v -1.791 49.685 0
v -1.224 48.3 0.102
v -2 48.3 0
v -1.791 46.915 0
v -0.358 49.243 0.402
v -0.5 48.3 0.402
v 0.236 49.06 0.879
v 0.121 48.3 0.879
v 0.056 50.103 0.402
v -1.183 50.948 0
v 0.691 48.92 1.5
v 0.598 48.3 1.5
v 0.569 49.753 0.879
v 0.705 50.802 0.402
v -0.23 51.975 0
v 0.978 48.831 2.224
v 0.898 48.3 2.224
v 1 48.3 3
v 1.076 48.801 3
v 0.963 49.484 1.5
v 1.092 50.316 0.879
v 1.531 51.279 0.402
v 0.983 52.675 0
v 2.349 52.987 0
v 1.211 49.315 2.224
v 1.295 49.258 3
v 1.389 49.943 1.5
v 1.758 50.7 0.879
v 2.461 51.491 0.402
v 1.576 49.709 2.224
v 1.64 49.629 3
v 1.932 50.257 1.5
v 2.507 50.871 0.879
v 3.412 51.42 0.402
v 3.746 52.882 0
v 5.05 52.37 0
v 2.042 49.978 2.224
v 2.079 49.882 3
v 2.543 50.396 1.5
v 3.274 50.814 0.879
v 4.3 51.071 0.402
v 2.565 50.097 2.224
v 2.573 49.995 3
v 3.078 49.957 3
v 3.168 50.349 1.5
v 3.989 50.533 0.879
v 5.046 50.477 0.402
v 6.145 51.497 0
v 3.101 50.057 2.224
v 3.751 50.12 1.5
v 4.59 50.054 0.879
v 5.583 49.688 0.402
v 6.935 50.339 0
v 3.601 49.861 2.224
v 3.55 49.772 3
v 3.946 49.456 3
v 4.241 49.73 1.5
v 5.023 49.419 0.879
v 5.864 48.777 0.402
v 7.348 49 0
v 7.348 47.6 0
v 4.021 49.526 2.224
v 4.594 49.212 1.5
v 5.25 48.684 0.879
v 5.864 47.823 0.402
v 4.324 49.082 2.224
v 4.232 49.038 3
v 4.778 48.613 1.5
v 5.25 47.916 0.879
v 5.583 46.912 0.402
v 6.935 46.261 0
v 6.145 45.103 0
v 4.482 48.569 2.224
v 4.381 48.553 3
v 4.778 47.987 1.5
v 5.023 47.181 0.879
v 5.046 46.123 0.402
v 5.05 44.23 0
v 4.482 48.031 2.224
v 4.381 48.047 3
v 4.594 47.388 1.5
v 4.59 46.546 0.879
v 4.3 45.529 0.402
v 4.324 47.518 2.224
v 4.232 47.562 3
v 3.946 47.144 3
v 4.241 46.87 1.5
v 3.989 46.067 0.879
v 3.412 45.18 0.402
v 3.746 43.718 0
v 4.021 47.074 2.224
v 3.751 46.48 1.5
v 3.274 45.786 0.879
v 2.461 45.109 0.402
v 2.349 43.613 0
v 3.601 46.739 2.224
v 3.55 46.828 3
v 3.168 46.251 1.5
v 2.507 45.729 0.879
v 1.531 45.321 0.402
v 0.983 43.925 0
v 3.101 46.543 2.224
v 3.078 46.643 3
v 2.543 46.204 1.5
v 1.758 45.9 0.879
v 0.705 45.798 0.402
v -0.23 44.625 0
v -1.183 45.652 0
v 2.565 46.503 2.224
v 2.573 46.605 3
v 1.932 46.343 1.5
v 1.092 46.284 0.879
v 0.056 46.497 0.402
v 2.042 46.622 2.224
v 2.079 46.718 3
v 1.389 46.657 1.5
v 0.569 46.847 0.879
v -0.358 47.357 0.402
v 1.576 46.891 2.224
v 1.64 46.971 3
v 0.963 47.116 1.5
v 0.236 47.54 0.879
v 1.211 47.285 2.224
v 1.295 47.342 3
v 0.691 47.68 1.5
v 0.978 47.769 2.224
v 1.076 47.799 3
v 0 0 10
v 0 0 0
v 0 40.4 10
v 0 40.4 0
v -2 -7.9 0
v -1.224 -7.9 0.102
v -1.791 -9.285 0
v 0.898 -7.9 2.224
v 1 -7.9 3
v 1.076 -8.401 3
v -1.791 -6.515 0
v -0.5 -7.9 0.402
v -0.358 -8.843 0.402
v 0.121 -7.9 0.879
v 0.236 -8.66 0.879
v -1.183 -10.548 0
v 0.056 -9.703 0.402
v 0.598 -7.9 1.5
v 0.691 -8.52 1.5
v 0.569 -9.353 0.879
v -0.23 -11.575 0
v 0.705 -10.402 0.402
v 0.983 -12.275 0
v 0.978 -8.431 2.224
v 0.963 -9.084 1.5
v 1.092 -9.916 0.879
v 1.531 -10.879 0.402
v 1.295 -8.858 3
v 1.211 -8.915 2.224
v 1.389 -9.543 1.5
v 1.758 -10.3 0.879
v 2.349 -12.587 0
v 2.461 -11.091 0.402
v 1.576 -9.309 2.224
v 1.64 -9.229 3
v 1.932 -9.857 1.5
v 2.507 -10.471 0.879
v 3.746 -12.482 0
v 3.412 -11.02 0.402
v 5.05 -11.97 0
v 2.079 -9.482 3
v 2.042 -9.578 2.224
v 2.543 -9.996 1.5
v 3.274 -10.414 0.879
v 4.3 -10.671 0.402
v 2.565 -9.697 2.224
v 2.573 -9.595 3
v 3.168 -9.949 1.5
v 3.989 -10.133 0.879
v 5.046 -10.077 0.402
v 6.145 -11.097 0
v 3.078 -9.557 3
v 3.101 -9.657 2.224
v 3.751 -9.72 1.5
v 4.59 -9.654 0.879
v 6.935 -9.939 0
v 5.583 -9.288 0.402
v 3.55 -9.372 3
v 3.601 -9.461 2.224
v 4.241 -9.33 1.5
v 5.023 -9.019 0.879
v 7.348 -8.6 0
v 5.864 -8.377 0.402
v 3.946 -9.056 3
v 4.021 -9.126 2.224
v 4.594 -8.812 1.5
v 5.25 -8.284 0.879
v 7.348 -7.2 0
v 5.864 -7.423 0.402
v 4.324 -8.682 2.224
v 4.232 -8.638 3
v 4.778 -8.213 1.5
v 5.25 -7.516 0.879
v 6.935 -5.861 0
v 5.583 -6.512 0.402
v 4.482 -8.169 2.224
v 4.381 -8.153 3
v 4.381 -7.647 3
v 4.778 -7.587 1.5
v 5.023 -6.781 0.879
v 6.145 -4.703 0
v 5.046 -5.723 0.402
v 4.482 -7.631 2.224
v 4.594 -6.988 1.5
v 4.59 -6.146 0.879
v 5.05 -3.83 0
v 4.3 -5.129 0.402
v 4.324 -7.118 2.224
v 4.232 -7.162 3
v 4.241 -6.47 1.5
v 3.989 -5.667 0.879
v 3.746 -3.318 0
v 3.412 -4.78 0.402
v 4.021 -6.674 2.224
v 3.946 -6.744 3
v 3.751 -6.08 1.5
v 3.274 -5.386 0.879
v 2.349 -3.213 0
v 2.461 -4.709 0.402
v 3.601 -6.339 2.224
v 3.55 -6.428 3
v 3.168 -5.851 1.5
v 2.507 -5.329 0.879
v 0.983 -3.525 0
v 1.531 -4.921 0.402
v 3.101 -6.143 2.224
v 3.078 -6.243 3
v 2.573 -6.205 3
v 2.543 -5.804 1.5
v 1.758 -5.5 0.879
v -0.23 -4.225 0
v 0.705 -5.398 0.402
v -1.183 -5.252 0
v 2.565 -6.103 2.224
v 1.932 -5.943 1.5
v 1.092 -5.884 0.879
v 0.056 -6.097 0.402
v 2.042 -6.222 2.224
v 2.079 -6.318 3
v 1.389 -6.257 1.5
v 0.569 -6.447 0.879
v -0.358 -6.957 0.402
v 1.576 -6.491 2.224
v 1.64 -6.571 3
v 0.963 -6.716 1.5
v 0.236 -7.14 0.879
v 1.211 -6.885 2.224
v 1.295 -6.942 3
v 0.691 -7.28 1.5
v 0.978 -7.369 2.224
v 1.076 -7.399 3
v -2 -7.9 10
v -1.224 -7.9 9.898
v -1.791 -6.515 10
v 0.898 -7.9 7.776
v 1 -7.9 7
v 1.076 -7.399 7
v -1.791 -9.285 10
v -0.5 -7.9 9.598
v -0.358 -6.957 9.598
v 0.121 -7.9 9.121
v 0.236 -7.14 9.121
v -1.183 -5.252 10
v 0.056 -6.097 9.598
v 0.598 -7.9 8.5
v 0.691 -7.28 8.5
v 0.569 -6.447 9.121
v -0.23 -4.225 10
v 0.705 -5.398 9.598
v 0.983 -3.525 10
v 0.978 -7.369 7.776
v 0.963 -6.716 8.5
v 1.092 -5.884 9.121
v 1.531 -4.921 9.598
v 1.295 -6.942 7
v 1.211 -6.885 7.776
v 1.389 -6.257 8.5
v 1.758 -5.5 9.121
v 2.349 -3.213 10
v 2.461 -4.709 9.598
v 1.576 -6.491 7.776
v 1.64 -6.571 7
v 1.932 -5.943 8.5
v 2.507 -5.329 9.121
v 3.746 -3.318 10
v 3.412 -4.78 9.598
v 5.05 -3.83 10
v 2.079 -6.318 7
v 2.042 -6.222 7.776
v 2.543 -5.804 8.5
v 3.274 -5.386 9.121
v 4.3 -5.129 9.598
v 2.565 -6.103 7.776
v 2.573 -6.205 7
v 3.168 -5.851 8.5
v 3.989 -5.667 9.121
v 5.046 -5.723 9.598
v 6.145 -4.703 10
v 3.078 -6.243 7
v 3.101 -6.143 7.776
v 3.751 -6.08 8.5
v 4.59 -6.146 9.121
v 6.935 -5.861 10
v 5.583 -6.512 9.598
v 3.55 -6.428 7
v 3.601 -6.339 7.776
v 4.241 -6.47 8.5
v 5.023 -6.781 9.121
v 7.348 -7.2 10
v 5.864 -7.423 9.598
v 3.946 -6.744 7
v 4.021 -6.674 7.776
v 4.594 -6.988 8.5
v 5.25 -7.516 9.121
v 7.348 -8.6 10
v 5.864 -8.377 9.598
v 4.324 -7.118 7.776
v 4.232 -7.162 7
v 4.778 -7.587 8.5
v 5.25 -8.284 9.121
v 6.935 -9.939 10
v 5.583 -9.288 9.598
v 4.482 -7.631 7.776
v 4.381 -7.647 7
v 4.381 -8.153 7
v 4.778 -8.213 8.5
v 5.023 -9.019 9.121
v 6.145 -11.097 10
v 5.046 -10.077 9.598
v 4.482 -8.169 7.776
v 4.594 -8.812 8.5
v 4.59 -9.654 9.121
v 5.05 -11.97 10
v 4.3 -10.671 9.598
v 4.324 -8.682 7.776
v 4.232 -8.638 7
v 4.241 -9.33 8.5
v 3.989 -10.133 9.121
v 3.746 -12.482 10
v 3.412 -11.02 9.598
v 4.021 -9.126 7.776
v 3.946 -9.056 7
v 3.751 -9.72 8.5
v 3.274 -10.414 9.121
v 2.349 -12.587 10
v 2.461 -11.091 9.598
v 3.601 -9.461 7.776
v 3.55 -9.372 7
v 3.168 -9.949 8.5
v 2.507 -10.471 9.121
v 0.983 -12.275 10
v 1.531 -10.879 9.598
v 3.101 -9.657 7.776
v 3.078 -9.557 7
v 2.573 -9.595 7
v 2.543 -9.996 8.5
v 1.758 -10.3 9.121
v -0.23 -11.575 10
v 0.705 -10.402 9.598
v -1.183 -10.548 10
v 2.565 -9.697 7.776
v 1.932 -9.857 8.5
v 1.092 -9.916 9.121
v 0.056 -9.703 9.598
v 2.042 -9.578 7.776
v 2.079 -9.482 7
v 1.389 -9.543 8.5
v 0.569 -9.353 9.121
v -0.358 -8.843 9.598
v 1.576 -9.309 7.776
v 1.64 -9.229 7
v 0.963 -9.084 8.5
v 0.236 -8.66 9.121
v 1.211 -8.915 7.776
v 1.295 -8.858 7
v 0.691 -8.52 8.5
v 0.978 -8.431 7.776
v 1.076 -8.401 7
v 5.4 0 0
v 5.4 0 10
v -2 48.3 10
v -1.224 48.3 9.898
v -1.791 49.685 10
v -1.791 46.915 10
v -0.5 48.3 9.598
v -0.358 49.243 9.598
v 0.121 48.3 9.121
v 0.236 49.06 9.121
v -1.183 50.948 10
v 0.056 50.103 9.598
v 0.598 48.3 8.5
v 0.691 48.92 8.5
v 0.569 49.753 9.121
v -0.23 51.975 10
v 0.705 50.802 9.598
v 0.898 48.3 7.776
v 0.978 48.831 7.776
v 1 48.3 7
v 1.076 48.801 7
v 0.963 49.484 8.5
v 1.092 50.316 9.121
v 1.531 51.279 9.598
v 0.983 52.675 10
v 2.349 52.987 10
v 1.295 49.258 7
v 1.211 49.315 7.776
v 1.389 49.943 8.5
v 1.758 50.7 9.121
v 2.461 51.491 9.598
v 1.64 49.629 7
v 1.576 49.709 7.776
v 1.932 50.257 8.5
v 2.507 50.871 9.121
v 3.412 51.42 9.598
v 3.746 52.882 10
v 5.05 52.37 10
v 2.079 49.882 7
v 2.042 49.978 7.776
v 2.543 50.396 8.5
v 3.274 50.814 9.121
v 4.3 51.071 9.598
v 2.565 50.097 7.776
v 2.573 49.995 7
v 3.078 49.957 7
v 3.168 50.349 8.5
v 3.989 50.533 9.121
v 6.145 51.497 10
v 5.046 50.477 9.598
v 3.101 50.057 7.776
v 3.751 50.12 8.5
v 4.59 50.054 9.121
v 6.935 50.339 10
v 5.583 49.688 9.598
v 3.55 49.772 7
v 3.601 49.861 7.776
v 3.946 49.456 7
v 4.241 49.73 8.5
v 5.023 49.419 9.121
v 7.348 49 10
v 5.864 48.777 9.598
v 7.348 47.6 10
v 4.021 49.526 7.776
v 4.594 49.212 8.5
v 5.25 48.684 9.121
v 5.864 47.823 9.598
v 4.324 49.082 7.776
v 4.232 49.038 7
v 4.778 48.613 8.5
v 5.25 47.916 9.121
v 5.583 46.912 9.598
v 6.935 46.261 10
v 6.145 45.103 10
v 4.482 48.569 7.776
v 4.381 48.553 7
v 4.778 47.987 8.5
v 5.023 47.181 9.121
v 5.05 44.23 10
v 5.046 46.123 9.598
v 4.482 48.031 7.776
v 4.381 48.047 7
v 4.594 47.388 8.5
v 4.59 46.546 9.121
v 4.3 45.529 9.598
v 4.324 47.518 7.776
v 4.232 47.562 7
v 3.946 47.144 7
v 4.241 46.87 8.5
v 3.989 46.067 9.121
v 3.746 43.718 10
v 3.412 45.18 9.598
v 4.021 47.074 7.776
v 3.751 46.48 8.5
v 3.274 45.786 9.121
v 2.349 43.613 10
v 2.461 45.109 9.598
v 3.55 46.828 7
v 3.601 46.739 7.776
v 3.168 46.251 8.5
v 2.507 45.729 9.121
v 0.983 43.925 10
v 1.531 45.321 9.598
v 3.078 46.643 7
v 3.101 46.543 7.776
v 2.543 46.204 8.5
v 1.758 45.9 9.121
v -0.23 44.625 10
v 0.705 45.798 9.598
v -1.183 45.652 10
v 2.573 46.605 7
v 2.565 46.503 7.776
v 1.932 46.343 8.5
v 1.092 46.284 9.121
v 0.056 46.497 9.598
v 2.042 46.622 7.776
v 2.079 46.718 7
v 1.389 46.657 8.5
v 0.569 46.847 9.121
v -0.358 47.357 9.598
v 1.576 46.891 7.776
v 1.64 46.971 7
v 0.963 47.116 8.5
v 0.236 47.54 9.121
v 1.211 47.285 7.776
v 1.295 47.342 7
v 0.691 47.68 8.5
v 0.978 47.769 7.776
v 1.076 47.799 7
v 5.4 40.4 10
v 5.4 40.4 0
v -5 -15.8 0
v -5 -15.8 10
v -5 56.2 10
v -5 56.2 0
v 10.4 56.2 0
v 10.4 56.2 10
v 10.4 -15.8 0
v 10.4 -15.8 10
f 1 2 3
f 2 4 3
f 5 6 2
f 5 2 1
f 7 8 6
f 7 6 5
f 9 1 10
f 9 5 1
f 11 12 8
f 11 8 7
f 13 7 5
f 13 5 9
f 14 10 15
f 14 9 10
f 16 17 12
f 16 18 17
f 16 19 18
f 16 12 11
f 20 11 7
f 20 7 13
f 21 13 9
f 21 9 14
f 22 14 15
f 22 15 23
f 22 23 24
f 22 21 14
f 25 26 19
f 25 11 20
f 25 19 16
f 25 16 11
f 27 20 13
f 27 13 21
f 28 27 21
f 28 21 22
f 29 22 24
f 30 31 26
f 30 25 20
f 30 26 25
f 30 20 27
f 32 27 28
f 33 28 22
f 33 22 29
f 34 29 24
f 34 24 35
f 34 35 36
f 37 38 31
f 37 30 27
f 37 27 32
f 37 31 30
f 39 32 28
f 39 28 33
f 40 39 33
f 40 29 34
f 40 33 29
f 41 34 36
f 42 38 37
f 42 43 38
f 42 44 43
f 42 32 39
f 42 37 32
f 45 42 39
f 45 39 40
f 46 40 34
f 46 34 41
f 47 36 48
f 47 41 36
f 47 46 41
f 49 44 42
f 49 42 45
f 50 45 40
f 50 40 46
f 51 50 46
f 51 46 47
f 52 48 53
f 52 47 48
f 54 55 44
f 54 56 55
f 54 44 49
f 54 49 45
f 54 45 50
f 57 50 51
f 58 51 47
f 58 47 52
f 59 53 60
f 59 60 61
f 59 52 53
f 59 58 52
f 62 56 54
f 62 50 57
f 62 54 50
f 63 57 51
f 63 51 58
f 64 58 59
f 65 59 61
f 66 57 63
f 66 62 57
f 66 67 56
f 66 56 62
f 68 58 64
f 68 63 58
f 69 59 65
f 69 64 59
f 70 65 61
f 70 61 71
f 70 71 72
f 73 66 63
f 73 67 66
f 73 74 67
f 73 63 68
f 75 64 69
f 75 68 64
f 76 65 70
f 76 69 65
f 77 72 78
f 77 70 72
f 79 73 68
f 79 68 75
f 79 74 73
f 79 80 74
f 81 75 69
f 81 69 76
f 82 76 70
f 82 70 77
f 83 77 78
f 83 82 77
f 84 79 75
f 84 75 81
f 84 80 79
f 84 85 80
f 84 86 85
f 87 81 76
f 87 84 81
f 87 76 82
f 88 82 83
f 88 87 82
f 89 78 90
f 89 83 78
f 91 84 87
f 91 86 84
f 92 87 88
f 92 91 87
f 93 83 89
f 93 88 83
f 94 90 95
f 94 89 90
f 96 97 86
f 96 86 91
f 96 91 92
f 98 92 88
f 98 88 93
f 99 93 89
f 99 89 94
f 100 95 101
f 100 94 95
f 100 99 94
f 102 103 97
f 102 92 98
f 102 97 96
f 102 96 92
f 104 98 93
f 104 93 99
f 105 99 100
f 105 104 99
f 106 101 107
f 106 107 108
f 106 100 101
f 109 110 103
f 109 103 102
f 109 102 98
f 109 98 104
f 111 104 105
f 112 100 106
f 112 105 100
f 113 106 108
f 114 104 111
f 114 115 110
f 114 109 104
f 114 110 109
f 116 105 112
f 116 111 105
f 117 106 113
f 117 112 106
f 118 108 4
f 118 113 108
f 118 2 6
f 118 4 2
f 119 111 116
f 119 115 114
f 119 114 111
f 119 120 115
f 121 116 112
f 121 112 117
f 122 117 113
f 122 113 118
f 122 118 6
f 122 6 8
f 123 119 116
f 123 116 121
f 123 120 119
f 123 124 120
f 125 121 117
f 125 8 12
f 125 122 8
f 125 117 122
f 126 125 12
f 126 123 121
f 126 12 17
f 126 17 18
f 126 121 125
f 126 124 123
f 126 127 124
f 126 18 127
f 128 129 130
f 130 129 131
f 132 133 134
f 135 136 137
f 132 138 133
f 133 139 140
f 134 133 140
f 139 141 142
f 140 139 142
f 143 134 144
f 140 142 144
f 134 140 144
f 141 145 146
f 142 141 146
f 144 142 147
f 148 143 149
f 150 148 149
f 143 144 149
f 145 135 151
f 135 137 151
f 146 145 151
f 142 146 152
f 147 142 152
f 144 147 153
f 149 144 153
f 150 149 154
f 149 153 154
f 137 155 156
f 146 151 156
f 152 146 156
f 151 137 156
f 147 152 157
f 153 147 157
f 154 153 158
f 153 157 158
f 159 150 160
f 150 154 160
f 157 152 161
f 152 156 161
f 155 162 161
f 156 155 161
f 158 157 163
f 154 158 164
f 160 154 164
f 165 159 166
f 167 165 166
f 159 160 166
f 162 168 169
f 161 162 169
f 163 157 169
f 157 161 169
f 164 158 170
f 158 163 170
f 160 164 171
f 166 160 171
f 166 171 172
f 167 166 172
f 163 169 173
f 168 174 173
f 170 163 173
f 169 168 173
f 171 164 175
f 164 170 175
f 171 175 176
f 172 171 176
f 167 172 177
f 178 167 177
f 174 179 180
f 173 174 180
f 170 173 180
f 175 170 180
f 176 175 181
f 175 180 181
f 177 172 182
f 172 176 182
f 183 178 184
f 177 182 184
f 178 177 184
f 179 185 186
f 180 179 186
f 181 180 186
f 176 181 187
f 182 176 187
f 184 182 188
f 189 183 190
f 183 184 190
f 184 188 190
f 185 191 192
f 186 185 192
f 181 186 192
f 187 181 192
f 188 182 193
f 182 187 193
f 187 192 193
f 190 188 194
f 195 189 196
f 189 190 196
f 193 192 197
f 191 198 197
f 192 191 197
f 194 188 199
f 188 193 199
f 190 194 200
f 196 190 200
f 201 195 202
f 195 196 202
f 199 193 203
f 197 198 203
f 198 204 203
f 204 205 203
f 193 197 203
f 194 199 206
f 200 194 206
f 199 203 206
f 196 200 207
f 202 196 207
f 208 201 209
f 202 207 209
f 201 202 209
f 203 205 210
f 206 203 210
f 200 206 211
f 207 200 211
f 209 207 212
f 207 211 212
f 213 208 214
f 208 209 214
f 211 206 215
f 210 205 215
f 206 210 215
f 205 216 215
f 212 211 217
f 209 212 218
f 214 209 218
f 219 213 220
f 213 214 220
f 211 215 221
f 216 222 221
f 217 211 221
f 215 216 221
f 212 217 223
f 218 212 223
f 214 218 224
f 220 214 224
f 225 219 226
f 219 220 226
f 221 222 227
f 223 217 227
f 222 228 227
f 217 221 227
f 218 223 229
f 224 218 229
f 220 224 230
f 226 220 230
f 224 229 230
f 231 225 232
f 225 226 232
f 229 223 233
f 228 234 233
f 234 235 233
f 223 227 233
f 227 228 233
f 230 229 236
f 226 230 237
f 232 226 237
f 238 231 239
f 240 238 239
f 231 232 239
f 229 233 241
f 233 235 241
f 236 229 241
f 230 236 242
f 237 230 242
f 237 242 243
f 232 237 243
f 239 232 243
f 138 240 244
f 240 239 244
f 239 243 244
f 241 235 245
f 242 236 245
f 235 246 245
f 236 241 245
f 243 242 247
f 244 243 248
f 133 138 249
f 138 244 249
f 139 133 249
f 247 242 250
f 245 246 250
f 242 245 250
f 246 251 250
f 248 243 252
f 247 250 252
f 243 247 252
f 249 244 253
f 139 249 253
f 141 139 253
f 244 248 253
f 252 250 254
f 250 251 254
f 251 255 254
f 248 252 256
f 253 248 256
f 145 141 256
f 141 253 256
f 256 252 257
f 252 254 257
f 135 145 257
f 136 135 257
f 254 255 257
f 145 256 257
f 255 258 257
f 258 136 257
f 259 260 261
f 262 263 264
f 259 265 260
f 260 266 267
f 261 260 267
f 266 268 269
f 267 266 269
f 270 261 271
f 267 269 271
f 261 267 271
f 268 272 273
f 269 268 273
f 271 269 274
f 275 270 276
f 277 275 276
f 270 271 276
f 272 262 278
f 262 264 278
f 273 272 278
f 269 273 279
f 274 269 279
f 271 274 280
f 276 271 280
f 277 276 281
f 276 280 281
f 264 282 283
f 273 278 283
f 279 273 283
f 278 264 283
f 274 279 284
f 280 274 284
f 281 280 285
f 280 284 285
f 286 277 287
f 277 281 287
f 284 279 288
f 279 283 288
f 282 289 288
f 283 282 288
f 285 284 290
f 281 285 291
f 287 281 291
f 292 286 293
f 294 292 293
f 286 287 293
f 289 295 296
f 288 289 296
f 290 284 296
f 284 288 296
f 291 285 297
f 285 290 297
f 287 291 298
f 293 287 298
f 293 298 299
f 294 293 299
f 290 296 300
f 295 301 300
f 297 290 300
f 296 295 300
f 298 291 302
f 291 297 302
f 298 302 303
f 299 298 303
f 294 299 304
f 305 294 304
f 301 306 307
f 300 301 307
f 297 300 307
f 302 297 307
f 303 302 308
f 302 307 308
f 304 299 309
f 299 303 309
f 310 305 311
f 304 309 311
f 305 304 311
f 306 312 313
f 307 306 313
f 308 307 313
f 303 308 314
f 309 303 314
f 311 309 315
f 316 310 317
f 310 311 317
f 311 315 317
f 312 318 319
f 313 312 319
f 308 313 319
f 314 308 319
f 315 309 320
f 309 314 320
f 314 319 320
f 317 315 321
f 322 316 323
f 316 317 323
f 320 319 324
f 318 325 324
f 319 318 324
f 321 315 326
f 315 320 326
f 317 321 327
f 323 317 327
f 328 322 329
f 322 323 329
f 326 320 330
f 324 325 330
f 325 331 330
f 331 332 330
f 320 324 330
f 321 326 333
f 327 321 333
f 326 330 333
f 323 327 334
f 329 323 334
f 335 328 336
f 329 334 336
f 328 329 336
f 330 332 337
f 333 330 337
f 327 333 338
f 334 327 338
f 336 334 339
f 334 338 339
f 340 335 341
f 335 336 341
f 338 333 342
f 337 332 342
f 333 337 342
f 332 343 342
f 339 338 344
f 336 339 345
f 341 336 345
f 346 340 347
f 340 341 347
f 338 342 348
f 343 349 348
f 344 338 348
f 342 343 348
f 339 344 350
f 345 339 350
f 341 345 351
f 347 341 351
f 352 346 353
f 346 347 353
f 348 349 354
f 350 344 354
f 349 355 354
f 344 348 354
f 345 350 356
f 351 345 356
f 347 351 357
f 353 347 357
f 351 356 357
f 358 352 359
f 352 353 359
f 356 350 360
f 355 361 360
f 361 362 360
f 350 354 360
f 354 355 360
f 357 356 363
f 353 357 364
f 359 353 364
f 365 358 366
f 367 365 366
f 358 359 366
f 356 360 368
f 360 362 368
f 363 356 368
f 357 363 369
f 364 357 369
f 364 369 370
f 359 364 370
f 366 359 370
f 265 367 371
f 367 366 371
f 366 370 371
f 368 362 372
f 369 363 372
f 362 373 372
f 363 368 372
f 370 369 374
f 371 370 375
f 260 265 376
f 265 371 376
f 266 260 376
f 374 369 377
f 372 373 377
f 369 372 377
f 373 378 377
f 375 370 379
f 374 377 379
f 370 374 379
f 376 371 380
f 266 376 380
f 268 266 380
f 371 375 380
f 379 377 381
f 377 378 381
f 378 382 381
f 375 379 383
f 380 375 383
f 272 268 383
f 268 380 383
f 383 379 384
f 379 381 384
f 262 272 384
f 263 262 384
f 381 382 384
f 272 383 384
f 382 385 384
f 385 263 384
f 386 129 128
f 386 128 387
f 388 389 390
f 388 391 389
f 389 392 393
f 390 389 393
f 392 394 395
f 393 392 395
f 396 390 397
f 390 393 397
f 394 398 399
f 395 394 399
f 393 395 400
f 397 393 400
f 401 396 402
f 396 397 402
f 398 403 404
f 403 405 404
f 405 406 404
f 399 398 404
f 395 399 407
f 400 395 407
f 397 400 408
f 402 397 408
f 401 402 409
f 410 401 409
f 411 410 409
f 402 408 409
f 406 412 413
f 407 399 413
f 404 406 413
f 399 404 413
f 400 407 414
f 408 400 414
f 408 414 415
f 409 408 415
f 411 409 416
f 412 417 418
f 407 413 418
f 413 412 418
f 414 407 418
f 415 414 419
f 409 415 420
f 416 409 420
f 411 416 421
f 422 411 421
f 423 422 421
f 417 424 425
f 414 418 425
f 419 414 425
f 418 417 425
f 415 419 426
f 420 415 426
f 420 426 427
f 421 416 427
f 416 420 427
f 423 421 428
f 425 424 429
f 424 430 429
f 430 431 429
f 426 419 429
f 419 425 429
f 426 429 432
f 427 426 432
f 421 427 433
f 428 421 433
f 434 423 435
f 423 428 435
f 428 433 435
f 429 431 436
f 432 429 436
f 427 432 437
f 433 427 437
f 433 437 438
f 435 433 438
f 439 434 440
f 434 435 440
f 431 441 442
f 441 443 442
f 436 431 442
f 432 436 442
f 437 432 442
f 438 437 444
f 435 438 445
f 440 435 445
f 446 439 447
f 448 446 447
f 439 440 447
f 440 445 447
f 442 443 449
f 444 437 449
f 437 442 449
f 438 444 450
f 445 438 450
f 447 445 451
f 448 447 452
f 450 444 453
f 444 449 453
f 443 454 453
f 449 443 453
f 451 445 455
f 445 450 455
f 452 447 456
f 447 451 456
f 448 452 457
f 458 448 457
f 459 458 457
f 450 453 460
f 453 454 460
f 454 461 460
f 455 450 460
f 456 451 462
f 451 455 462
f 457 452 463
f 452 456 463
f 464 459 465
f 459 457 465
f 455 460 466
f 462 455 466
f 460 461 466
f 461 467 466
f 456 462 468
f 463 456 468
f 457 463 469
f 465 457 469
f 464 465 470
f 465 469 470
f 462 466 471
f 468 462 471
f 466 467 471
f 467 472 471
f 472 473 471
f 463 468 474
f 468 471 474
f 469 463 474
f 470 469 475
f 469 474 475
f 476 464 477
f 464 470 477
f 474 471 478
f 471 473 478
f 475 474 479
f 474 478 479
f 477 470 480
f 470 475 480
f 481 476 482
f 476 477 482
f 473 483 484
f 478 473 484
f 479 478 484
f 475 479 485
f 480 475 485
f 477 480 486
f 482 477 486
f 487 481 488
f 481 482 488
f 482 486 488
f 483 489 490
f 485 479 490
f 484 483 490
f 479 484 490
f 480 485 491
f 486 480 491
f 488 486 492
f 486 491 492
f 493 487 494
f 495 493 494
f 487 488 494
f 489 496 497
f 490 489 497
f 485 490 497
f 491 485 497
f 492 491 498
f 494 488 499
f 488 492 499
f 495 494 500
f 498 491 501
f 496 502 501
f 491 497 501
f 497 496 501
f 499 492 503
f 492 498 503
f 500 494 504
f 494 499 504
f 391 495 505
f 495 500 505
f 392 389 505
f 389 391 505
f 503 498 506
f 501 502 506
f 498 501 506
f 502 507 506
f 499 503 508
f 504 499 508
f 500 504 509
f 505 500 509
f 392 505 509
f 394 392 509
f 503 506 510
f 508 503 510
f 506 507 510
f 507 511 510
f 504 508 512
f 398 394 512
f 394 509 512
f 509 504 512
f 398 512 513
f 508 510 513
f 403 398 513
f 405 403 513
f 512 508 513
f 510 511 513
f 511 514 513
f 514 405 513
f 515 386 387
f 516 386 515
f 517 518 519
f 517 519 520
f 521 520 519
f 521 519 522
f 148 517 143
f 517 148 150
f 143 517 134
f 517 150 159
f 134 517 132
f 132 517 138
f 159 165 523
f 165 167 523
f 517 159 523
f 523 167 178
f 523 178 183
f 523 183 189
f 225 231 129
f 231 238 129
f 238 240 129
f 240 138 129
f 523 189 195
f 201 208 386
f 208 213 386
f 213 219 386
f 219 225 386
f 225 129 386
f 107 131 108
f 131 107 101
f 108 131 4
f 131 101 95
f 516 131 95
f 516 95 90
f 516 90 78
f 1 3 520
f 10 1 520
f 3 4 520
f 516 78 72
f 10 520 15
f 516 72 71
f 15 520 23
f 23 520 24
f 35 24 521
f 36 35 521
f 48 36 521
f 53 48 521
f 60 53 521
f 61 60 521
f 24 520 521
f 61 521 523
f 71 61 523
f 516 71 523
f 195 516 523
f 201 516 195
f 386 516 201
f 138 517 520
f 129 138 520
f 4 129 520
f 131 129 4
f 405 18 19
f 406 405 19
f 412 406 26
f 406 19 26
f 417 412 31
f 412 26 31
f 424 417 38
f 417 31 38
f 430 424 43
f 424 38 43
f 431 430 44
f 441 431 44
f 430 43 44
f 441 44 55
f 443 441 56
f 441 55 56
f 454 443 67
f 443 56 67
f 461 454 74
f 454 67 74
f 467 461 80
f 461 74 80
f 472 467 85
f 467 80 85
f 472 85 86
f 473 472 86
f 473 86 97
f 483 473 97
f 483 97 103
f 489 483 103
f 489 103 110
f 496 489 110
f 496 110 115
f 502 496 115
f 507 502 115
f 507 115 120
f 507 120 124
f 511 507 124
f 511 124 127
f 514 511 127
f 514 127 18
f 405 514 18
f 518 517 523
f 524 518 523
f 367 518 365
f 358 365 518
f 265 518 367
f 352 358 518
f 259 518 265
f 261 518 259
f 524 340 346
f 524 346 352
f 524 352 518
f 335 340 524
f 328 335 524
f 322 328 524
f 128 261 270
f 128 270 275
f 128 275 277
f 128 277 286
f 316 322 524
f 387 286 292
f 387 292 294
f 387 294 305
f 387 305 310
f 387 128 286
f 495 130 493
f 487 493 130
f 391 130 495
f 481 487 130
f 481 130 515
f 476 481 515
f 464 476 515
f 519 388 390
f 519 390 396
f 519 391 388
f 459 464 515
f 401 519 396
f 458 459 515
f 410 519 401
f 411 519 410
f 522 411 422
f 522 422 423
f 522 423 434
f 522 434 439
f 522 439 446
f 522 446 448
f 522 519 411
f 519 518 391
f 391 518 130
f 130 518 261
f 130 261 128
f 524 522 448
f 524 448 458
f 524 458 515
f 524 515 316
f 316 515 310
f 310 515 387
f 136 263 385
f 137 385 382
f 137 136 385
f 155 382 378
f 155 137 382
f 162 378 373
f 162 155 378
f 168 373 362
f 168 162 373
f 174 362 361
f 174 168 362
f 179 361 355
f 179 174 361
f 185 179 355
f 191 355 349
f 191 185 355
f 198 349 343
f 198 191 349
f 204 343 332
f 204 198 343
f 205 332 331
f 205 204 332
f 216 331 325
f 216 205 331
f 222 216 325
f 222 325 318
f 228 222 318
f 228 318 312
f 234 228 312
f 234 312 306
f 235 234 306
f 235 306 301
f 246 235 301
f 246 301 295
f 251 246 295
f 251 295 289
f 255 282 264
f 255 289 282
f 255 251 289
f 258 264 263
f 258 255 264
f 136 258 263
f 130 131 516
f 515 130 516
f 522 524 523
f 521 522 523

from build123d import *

# Parameters (mm, degrees)
SKETCH1_W           = 15.4
SKETCH1_H           = 50.4
SKETCH1_W_2         = 5.4
SKETCH1_H_2         = 40.4
EXTRUDE_THIN1_DEPTH = 10
SKETCH2_W           = 15.4
SKETCH2_H           = 10
BOSS_EXTRUDE1_DEPTH = 10.8
SKETCH3_R           = 1.7
CUT_EXTRUDE1_DEPTH  = 59.022409464
FILLET1_R           = 3


with BuildPart() as part:
    # Sketch1 → Extrude-Thin1 (new body)
    with BuildSketch(Plane.XY):
        with Locations((2.7, 20.2)):
            Rectangle(SKETCH1_W, SKETCH1_H)
        with Locations((2.7, 20.2)):
            Rectangle(SKETCH1_W_2, SKETCH1_H_2, mode=Mode.SUBTRACT)
    extrude(amount=EXTRUDE_THIN1_DEPTH)

    # Sketch2 → Boss-Extrude1 (add)
    with BuildSketch(Plane(origin=(0, 45.4, 0), x_dir=(1, 0, 0), z_dir=(0, 1, 0))):
        with Locations((2.7, -5)):
            Rectangle(SKETCH2_W, SKETCH2_H)
    boss_extrude1 = extrude(amount=BOSS_EXTRUDE1_DEPTH)

    # Mirror1: Boss-Extrude1 across plane
    add(boss_extrude1.mirror(Plane.ZX.offset(20.2)))

    # Sketch3 → Cut-Extrude1 (cut, through all)
    with BuildSketch(Plane(origin=(0, 0, 0), x_dir=(-1, 0, 0), z_dir=(0, 0, -1))):
        with Locations((-2.7, 48.3)):
            Circle(SKETCH3_R)
    cut_extrude1 = extrude(amount=-CUT_EXTRUDE1_DEPTH, mode=Mode.SUBTRACT)

    # Mirror2: Cut-Extrude1 across plane
    add(cut_extrude1.mirror(Plane.ZX.offset(20.2)), mode=Mode.SUBTRACT)

    # Fillet1
    fillet1_edges = [part.edges().sort_by_distance(p)[0] for p in [
        (4.4, 48.3, 10),
        (4.4, 48.3, 0),
        (4.4, -7.9, 0),
        (4.4, -7.9, 10),
    ]]
    fillet(fillet1_edges, radius=FILLET1_R)


solid = part.part
